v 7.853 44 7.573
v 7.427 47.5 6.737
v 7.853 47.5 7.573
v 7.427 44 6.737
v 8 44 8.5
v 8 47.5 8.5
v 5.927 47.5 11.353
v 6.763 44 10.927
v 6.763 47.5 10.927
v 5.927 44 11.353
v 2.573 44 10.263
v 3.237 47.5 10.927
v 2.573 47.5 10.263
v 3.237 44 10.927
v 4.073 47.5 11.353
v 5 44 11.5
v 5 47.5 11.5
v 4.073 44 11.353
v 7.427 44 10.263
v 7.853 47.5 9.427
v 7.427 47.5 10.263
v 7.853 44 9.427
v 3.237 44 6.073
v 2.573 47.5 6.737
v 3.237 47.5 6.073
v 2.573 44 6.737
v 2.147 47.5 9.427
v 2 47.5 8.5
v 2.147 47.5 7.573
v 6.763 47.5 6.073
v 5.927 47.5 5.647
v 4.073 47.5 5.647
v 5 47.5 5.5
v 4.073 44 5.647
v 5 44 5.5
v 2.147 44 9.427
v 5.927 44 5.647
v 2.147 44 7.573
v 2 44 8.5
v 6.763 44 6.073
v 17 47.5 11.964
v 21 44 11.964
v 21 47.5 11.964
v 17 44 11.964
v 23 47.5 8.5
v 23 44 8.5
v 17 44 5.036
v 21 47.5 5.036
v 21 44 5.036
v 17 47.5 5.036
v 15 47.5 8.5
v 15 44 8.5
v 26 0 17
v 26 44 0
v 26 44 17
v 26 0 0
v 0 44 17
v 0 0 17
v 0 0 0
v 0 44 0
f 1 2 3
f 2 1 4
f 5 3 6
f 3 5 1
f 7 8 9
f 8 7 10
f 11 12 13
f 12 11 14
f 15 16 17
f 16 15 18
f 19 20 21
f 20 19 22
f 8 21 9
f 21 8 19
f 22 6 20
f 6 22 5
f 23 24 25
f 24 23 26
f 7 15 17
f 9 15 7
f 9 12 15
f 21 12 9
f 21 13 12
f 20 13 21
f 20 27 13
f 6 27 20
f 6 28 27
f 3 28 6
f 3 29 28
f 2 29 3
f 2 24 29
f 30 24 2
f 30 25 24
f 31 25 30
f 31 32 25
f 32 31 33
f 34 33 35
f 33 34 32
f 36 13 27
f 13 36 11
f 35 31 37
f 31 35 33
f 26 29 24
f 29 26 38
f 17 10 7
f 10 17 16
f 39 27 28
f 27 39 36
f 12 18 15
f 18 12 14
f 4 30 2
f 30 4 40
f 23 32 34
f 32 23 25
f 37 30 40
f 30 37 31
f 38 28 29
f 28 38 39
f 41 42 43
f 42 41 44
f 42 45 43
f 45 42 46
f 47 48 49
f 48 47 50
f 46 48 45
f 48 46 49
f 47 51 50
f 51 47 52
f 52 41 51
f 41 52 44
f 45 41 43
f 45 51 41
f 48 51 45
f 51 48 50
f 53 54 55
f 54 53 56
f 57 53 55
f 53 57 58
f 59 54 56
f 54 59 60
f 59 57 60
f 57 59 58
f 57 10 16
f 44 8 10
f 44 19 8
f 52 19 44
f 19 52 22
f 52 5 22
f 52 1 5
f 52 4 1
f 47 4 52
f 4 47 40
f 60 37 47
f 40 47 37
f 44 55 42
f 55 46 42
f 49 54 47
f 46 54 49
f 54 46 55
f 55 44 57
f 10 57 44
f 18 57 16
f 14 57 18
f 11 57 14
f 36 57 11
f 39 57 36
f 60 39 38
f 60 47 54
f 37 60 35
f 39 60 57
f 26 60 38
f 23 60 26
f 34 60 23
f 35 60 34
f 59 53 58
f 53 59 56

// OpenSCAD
$fn=20;
module ninevolt()
{
          color([0.4,0.4,0.4,1])
          cube([26,44,17]);	
	color([0.8,0.8,0.9,1])
	{
					
		translate([5,1,8.5]) rotate([-90,0,0])
				cylinder(r=3,h=46.5);			
		translate([19,1,8.5]) rotate([-90,0,0])
			cylinder(r=4,h=46.5, $fn=6);		
	}
}

ninevolt();
